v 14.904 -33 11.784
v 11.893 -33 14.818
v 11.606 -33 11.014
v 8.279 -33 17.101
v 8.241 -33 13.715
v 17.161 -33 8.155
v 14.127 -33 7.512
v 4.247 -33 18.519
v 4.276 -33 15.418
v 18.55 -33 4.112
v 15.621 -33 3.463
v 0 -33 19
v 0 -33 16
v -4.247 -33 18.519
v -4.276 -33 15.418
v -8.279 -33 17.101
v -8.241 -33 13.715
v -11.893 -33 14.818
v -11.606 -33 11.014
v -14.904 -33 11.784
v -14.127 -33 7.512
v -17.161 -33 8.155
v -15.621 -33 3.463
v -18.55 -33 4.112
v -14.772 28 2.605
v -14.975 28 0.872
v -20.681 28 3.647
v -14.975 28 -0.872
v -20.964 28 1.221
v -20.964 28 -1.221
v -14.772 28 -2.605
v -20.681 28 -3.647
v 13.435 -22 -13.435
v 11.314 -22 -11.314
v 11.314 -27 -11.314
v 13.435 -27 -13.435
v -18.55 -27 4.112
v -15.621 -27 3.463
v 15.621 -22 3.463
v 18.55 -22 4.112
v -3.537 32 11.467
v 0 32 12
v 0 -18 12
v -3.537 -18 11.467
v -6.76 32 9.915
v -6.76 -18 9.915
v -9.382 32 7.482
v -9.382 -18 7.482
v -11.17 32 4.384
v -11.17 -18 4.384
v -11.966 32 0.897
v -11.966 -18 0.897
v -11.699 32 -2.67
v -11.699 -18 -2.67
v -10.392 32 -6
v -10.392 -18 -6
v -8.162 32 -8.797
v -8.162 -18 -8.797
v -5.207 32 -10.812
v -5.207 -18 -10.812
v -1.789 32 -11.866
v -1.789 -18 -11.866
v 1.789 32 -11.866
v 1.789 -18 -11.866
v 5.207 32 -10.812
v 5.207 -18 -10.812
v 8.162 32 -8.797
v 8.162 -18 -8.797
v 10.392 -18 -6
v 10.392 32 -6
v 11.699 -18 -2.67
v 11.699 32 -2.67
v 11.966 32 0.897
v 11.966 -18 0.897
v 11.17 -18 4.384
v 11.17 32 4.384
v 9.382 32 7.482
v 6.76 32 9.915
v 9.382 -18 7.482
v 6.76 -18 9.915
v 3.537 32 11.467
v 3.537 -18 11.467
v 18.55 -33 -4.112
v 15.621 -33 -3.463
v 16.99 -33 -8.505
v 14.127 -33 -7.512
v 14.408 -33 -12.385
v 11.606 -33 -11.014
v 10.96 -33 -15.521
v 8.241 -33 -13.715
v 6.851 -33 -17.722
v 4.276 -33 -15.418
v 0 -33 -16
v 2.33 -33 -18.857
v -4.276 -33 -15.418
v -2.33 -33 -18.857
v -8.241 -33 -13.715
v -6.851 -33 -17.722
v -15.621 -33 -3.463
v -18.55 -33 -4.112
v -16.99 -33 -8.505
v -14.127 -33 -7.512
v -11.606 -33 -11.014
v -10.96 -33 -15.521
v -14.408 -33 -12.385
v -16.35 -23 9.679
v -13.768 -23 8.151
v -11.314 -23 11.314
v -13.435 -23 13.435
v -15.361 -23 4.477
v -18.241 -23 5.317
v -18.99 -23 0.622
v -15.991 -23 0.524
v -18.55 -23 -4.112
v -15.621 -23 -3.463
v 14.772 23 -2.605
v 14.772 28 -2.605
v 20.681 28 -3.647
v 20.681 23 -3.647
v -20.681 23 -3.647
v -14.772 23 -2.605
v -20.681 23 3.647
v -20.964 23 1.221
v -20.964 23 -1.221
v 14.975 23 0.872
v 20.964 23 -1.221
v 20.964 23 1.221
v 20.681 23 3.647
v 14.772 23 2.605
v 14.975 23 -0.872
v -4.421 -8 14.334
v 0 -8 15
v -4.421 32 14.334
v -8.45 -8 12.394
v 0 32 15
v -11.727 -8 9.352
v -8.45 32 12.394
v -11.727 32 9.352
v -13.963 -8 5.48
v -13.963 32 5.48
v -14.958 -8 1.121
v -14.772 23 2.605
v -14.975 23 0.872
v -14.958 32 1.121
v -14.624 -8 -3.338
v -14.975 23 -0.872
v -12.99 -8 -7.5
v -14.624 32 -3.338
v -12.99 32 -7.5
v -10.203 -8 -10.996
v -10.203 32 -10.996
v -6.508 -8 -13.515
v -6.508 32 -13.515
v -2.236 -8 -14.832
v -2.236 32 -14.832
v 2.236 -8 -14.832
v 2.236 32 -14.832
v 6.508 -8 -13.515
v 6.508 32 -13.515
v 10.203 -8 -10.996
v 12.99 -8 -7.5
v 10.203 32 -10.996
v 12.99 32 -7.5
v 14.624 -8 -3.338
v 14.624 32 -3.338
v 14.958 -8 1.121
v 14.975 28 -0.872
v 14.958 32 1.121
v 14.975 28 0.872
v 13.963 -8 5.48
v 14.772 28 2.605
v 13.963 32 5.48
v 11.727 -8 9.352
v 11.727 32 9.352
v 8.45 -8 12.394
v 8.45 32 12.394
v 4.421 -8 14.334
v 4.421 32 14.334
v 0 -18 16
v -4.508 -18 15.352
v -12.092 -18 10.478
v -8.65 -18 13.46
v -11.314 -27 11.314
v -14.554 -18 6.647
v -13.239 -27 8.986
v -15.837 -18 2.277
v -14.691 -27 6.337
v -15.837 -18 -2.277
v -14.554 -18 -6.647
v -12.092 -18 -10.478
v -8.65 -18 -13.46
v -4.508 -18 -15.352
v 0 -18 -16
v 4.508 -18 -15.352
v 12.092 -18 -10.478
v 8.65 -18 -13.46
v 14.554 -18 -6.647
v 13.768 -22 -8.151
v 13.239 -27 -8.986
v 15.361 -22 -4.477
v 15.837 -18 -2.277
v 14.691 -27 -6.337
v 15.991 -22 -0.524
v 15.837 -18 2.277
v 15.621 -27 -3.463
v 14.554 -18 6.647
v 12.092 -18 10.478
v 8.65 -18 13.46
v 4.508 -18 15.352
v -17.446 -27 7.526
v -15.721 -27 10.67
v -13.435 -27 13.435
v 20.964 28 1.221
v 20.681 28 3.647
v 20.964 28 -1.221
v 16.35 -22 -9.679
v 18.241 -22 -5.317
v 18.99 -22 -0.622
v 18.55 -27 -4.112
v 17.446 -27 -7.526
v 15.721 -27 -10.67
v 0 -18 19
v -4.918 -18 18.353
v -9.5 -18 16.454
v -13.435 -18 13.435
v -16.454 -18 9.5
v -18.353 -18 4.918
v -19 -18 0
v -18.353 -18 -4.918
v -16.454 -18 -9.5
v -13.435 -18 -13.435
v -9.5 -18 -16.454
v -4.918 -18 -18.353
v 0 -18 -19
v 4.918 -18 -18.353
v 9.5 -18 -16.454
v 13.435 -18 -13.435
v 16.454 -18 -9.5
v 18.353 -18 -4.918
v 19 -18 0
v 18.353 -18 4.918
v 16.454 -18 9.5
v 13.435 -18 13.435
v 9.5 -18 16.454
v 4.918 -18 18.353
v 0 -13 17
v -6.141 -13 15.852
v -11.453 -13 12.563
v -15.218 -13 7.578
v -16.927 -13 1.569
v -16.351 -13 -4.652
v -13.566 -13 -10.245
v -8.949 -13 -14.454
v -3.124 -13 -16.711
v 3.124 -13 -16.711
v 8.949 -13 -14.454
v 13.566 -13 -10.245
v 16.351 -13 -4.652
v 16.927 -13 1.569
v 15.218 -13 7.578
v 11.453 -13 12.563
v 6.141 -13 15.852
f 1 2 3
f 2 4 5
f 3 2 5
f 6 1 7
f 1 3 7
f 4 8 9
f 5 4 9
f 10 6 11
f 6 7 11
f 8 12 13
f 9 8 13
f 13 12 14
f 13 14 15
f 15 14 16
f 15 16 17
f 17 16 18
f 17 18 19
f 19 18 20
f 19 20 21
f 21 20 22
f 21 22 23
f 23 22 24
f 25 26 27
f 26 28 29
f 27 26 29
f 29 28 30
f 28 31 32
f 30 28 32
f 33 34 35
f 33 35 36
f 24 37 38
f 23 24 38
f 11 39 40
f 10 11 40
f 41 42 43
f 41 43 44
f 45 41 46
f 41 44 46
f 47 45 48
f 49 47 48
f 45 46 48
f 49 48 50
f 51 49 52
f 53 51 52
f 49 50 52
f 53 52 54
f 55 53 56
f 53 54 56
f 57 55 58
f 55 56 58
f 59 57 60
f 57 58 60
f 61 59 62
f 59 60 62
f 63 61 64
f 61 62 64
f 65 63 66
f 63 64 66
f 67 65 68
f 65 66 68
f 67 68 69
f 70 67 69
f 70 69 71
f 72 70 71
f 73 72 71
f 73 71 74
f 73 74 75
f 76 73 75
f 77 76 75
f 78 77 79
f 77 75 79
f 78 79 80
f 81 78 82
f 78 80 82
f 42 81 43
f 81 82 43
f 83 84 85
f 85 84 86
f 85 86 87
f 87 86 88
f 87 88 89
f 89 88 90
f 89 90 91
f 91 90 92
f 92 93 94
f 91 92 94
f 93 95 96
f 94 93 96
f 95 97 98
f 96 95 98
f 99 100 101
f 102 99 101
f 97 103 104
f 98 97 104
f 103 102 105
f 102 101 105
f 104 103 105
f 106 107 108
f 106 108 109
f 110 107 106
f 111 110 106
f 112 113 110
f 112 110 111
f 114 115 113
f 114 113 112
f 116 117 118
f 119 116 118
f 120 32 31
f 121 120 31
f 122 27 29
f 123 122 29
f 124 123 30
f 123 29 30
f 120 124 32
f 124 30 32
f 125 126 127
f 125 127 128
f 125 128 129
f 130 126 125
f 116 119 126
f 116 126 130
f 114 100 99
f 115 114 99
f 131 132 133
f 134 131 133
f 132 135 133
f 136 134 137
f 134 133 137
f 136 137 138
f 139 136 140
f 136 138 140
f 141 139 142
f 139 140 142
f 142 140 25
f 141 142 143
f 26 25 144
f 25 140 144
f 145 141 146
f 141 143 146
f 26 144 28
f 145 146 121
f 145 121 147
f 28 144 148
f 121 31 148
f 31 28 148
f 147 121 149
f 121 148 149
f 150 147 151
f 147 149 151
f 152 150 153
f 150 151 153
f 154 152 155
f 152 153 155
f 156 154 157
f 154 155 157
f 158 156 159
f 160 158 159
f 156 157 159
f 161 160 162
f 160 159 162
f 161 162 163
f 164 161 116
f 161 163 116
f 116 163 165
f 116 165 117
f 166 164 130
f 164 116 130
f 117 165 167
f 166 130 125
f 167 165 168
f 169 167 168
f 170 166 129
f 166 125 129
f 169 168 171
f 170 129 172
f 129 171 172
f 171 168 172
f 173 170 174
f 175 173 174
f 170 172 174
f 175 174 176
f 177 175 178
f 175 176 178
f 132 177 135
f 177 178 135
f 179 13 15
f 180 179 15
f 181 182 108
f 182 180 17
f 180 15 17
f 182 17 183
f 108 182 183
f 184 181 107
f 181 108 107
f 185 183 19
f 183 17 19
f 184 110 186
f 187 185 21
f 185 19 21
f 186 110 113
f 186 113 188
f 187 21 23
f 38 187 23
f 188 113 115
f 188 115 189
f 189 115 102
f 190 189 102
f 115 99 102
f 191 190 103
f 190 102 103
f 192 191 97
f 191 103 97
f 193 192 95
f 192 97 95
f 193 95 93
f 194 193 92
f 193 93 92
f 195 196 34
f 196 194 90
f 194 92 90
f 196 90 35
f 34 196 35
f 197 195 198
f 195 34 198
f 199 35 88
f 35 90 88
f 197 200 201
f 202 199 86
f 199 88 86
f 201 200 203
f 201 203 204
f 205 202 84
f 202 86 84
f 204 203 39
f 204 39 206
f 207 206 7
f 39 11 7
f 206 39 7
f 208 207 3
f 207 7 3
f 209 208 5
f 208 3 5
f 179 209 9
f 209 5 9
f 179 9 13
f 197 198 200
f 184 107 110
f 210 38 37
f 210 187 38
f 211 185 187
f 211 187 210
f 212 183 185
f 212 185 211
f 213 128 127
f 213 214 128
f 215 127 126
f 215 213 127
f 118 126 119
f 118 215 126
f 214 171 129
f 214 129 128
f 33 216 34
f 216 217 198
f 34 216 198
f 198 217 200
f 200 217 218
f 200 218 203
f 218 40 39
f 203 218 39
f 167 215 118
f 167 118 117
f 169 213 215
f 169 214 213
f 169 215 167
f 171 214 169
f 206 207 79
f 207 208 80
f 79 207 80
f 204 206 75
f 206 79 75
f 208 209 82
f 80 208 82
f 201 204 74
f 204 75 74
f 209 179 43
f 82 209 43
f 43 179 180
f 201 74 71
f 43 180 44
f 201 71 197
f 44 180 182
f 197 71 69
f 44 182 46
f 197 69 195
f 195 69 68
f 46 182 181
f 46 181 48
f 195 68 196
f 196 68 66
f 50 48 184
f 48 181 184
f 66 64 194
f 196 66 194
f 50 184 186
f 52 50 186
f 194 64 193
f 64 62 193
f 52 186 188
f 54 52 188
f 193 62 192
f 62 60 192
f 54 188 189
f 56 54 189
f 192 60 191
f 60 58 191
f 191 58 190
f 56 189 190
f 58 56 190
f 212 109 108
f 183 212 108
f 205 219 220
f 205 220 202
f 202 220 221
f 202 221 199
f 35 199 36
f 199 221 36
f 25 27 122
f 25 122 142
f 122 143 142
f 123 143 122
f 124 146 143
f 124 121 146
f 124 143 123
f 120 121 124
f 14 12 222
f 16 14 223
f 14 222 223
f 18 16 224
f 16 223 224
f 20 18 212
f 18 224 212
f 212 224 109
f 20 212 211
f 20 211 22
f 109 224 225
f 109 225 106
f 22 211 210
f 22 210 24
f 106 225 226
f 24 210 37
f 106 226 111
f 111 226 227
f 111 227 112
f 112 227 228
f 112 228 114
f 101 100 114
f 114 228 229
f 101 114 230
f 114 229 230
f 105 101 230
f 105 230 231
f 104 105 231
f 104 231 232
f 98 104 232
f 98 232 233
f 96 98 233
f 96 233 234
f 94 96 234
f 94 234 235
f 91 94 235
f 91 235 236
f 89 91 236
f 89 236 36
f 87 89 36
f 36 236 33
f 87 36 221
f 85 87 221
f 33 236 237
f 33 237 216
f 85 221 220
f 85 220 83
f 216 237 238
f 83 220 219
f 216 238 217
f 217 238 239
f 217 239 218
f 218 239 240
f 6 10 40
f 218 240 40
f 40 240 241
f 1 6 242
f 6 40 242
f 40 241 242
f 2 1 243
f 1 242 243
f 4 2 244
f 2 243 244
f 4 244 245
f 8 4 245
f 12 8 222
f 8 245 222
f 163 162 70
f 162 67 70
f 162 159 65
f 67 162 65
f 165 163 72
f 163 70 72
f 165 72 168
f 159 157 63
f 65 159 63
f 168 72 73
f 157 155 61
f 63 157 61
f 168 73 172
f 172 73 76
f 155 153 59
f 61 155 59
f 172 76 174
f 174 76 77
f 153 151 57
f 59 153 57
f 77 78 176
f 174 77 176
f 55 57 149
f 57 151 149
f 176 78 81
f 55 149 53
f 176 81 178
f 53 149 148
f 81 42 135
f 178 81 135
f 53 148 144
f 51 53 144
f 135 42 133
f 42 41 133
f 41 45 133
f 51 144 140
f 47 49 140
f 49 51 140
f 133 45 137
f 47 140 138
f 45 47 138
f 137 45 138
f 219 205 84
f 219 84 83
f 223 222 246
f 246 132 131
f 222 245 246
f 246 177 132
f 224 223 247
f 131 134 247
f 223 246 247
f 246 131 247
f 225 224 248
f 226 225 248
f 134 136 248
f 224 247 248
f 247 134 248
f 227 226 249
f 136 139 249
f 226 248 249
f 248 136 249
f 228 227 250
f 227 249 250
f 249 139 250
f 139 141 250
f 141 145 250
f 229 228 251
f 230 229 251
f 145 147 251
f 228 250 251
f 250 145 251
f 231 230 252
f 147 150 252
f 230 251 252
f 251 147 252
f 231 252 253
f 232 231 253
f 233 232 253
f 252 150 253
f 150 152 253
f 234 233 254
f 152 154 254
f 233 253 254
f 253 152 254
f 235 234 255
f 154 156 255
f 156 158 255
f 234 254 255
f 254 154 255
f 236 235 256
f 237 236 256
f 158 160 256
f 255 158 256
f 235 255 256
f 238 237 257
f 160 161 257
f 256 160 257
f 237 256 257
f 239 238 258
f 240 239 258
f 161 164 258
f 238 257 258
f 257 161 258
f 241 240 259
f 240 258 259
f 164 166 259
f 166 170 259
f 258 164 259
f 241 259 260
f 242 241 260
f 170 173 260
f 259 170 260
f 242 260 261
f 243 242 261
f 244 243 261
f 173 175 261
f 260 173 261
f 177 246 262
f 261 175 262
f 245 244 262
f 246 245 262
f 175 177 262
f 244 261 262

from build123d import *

# Parameters (mm, degrees)
SKETCH2_W          = 6
SKETCH2_H          = 5
REVOLVE2_ANGLE     = 20
SKETCH3_W          = 3
SKETCH3_H          = 10
SKETCH3_H_2        = 11
CUT_REVOLVE1_ANGLE = 25
SKETCH4_W          = 3
SKETCH4_H          = 5
SKETCH4_H_2        = 4
CUT_REVOLVE2_ANGLE = 45


with BuildPart() as part:
    # Sketch1 → Revolve1 (revolve)
    with BuildSketch(Plane.XY, mode=Mode.PRIVATE) as revolve1_sk:
        Polygon((12, 32), (12, -18), (16, -18), (16, -33), (19, -33), (19, -18), (15, -8), (15, 32), align=None)
    revolve(revolve1_sk.sketch.rotate(Axis((0, 40.467735012, 0), (0, -1, 0)), 90), axis=Axis((0, 40.467735012, 0), (0, -1, 0)))

    # Sketch2 → Revolve2 (revolve, symmetric)
    with BuildSketch(Plane.XY) as revolve2_sk:
        with Locations((18, 25.5)):
            Rectangle(SKETCH2_W, SKETCH2_H)
        with Locations((-18, 25.5)):
            Rectangle(SKETCH2_W, SKETCH2_H)
    revolve(axis=Axis((0, 45.306661743, 0), (0, -1, 0)), revolution_arc=REVOLVE2_ANGLE / 2)
    revolve(revolve2_sk.sketch, axis=Axis((0, 45.306661743, 0), (0, 1, 0)), revolution_arc=REVOLVE2_ANGLE / 2)

    # Sketch3 → Cut-Revolve1 (revolve, symmetric, cut)
    with BuildSketch(Plane.XY) as cut_revolve1_sk:
        with Locations((-17.5, -28)):
            Rectangle(SKETCH3_W, SKETCH3_H)
        with Locations((17.5, -27.5)):
            Rectangle(SKETCH3_W, SKETCH3_H_2)
    revolve(axis=Axis((0, -11.020729768, 0), (0, -1, 0)), revolution_arc=CUT_REVOLVE1_ANGLE / 2, mode=Mode.SUBTRACT)
    revolve(cut_revolve1_sk.sketch, axis=Axis((0, -11.020729768, 0), (0, 1, 0)), revolution_arc=CUT_REVOLVE1_ANGLE / 2, mode=Mode.SUBTRACT)

    # Sketch4 → Cut-Revolve2 (revolve, cut)
    with BuildSketch(Plane.XY):
        with Locations((17.5, -24.5)):
            Rectangle(SKETCH4_W, SKETCH4_H)
        with Locations((-17.5, -25)):
            Rectangle(SKETCH4_W, SKETCH4_H_2)
    revolve(axis=Axis((0, -42.004114959, 0), (0, 1, 0)), revolution_arc=CUT_REVOLVE2_ANGLE, mode=Mode.SUBTRACT)


solid = part.part
